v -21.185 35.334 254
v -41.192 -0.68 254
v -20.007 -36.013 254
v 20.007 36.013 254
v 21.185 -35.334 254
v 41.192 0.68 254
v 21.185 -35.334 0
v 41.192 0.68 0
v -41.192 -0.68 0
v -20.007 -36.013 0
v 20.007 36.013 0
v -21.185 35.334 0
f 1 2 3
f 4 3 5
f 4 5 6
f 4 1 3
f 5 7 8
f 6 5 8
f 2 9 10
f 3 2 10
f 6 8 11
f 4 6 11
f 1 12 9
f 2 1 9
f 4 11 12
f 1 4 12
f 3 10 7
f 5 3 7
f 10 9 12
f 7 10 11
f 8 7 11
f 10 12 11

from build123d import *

# Parameters (mm, degrees)
F1_DEPTH = 254
F2_R     = 23.522227
F3_DEPTH = 111.76


with BuildPart() as f1:
    # F0 (on Top) → F1 (new body)
    with BuildSketch(Plane.XY):
        Polygon((-21.18477, 35.333617), (-41.192195, -0.679741), (-20.007425, -36.013357), (21.18477, -35.333617), (41.192195, 0.679741), (20.007425, 36.013357), align=None)
    extrude(amount=F1_DEPTH)

    # F2 (on face) → F3 (join)
    with BuildSketch(Plane.XY.offset(254)):
        Circle(F2_R)
    extrude(amount=-F3_DEPTH)


solid = f1.part
